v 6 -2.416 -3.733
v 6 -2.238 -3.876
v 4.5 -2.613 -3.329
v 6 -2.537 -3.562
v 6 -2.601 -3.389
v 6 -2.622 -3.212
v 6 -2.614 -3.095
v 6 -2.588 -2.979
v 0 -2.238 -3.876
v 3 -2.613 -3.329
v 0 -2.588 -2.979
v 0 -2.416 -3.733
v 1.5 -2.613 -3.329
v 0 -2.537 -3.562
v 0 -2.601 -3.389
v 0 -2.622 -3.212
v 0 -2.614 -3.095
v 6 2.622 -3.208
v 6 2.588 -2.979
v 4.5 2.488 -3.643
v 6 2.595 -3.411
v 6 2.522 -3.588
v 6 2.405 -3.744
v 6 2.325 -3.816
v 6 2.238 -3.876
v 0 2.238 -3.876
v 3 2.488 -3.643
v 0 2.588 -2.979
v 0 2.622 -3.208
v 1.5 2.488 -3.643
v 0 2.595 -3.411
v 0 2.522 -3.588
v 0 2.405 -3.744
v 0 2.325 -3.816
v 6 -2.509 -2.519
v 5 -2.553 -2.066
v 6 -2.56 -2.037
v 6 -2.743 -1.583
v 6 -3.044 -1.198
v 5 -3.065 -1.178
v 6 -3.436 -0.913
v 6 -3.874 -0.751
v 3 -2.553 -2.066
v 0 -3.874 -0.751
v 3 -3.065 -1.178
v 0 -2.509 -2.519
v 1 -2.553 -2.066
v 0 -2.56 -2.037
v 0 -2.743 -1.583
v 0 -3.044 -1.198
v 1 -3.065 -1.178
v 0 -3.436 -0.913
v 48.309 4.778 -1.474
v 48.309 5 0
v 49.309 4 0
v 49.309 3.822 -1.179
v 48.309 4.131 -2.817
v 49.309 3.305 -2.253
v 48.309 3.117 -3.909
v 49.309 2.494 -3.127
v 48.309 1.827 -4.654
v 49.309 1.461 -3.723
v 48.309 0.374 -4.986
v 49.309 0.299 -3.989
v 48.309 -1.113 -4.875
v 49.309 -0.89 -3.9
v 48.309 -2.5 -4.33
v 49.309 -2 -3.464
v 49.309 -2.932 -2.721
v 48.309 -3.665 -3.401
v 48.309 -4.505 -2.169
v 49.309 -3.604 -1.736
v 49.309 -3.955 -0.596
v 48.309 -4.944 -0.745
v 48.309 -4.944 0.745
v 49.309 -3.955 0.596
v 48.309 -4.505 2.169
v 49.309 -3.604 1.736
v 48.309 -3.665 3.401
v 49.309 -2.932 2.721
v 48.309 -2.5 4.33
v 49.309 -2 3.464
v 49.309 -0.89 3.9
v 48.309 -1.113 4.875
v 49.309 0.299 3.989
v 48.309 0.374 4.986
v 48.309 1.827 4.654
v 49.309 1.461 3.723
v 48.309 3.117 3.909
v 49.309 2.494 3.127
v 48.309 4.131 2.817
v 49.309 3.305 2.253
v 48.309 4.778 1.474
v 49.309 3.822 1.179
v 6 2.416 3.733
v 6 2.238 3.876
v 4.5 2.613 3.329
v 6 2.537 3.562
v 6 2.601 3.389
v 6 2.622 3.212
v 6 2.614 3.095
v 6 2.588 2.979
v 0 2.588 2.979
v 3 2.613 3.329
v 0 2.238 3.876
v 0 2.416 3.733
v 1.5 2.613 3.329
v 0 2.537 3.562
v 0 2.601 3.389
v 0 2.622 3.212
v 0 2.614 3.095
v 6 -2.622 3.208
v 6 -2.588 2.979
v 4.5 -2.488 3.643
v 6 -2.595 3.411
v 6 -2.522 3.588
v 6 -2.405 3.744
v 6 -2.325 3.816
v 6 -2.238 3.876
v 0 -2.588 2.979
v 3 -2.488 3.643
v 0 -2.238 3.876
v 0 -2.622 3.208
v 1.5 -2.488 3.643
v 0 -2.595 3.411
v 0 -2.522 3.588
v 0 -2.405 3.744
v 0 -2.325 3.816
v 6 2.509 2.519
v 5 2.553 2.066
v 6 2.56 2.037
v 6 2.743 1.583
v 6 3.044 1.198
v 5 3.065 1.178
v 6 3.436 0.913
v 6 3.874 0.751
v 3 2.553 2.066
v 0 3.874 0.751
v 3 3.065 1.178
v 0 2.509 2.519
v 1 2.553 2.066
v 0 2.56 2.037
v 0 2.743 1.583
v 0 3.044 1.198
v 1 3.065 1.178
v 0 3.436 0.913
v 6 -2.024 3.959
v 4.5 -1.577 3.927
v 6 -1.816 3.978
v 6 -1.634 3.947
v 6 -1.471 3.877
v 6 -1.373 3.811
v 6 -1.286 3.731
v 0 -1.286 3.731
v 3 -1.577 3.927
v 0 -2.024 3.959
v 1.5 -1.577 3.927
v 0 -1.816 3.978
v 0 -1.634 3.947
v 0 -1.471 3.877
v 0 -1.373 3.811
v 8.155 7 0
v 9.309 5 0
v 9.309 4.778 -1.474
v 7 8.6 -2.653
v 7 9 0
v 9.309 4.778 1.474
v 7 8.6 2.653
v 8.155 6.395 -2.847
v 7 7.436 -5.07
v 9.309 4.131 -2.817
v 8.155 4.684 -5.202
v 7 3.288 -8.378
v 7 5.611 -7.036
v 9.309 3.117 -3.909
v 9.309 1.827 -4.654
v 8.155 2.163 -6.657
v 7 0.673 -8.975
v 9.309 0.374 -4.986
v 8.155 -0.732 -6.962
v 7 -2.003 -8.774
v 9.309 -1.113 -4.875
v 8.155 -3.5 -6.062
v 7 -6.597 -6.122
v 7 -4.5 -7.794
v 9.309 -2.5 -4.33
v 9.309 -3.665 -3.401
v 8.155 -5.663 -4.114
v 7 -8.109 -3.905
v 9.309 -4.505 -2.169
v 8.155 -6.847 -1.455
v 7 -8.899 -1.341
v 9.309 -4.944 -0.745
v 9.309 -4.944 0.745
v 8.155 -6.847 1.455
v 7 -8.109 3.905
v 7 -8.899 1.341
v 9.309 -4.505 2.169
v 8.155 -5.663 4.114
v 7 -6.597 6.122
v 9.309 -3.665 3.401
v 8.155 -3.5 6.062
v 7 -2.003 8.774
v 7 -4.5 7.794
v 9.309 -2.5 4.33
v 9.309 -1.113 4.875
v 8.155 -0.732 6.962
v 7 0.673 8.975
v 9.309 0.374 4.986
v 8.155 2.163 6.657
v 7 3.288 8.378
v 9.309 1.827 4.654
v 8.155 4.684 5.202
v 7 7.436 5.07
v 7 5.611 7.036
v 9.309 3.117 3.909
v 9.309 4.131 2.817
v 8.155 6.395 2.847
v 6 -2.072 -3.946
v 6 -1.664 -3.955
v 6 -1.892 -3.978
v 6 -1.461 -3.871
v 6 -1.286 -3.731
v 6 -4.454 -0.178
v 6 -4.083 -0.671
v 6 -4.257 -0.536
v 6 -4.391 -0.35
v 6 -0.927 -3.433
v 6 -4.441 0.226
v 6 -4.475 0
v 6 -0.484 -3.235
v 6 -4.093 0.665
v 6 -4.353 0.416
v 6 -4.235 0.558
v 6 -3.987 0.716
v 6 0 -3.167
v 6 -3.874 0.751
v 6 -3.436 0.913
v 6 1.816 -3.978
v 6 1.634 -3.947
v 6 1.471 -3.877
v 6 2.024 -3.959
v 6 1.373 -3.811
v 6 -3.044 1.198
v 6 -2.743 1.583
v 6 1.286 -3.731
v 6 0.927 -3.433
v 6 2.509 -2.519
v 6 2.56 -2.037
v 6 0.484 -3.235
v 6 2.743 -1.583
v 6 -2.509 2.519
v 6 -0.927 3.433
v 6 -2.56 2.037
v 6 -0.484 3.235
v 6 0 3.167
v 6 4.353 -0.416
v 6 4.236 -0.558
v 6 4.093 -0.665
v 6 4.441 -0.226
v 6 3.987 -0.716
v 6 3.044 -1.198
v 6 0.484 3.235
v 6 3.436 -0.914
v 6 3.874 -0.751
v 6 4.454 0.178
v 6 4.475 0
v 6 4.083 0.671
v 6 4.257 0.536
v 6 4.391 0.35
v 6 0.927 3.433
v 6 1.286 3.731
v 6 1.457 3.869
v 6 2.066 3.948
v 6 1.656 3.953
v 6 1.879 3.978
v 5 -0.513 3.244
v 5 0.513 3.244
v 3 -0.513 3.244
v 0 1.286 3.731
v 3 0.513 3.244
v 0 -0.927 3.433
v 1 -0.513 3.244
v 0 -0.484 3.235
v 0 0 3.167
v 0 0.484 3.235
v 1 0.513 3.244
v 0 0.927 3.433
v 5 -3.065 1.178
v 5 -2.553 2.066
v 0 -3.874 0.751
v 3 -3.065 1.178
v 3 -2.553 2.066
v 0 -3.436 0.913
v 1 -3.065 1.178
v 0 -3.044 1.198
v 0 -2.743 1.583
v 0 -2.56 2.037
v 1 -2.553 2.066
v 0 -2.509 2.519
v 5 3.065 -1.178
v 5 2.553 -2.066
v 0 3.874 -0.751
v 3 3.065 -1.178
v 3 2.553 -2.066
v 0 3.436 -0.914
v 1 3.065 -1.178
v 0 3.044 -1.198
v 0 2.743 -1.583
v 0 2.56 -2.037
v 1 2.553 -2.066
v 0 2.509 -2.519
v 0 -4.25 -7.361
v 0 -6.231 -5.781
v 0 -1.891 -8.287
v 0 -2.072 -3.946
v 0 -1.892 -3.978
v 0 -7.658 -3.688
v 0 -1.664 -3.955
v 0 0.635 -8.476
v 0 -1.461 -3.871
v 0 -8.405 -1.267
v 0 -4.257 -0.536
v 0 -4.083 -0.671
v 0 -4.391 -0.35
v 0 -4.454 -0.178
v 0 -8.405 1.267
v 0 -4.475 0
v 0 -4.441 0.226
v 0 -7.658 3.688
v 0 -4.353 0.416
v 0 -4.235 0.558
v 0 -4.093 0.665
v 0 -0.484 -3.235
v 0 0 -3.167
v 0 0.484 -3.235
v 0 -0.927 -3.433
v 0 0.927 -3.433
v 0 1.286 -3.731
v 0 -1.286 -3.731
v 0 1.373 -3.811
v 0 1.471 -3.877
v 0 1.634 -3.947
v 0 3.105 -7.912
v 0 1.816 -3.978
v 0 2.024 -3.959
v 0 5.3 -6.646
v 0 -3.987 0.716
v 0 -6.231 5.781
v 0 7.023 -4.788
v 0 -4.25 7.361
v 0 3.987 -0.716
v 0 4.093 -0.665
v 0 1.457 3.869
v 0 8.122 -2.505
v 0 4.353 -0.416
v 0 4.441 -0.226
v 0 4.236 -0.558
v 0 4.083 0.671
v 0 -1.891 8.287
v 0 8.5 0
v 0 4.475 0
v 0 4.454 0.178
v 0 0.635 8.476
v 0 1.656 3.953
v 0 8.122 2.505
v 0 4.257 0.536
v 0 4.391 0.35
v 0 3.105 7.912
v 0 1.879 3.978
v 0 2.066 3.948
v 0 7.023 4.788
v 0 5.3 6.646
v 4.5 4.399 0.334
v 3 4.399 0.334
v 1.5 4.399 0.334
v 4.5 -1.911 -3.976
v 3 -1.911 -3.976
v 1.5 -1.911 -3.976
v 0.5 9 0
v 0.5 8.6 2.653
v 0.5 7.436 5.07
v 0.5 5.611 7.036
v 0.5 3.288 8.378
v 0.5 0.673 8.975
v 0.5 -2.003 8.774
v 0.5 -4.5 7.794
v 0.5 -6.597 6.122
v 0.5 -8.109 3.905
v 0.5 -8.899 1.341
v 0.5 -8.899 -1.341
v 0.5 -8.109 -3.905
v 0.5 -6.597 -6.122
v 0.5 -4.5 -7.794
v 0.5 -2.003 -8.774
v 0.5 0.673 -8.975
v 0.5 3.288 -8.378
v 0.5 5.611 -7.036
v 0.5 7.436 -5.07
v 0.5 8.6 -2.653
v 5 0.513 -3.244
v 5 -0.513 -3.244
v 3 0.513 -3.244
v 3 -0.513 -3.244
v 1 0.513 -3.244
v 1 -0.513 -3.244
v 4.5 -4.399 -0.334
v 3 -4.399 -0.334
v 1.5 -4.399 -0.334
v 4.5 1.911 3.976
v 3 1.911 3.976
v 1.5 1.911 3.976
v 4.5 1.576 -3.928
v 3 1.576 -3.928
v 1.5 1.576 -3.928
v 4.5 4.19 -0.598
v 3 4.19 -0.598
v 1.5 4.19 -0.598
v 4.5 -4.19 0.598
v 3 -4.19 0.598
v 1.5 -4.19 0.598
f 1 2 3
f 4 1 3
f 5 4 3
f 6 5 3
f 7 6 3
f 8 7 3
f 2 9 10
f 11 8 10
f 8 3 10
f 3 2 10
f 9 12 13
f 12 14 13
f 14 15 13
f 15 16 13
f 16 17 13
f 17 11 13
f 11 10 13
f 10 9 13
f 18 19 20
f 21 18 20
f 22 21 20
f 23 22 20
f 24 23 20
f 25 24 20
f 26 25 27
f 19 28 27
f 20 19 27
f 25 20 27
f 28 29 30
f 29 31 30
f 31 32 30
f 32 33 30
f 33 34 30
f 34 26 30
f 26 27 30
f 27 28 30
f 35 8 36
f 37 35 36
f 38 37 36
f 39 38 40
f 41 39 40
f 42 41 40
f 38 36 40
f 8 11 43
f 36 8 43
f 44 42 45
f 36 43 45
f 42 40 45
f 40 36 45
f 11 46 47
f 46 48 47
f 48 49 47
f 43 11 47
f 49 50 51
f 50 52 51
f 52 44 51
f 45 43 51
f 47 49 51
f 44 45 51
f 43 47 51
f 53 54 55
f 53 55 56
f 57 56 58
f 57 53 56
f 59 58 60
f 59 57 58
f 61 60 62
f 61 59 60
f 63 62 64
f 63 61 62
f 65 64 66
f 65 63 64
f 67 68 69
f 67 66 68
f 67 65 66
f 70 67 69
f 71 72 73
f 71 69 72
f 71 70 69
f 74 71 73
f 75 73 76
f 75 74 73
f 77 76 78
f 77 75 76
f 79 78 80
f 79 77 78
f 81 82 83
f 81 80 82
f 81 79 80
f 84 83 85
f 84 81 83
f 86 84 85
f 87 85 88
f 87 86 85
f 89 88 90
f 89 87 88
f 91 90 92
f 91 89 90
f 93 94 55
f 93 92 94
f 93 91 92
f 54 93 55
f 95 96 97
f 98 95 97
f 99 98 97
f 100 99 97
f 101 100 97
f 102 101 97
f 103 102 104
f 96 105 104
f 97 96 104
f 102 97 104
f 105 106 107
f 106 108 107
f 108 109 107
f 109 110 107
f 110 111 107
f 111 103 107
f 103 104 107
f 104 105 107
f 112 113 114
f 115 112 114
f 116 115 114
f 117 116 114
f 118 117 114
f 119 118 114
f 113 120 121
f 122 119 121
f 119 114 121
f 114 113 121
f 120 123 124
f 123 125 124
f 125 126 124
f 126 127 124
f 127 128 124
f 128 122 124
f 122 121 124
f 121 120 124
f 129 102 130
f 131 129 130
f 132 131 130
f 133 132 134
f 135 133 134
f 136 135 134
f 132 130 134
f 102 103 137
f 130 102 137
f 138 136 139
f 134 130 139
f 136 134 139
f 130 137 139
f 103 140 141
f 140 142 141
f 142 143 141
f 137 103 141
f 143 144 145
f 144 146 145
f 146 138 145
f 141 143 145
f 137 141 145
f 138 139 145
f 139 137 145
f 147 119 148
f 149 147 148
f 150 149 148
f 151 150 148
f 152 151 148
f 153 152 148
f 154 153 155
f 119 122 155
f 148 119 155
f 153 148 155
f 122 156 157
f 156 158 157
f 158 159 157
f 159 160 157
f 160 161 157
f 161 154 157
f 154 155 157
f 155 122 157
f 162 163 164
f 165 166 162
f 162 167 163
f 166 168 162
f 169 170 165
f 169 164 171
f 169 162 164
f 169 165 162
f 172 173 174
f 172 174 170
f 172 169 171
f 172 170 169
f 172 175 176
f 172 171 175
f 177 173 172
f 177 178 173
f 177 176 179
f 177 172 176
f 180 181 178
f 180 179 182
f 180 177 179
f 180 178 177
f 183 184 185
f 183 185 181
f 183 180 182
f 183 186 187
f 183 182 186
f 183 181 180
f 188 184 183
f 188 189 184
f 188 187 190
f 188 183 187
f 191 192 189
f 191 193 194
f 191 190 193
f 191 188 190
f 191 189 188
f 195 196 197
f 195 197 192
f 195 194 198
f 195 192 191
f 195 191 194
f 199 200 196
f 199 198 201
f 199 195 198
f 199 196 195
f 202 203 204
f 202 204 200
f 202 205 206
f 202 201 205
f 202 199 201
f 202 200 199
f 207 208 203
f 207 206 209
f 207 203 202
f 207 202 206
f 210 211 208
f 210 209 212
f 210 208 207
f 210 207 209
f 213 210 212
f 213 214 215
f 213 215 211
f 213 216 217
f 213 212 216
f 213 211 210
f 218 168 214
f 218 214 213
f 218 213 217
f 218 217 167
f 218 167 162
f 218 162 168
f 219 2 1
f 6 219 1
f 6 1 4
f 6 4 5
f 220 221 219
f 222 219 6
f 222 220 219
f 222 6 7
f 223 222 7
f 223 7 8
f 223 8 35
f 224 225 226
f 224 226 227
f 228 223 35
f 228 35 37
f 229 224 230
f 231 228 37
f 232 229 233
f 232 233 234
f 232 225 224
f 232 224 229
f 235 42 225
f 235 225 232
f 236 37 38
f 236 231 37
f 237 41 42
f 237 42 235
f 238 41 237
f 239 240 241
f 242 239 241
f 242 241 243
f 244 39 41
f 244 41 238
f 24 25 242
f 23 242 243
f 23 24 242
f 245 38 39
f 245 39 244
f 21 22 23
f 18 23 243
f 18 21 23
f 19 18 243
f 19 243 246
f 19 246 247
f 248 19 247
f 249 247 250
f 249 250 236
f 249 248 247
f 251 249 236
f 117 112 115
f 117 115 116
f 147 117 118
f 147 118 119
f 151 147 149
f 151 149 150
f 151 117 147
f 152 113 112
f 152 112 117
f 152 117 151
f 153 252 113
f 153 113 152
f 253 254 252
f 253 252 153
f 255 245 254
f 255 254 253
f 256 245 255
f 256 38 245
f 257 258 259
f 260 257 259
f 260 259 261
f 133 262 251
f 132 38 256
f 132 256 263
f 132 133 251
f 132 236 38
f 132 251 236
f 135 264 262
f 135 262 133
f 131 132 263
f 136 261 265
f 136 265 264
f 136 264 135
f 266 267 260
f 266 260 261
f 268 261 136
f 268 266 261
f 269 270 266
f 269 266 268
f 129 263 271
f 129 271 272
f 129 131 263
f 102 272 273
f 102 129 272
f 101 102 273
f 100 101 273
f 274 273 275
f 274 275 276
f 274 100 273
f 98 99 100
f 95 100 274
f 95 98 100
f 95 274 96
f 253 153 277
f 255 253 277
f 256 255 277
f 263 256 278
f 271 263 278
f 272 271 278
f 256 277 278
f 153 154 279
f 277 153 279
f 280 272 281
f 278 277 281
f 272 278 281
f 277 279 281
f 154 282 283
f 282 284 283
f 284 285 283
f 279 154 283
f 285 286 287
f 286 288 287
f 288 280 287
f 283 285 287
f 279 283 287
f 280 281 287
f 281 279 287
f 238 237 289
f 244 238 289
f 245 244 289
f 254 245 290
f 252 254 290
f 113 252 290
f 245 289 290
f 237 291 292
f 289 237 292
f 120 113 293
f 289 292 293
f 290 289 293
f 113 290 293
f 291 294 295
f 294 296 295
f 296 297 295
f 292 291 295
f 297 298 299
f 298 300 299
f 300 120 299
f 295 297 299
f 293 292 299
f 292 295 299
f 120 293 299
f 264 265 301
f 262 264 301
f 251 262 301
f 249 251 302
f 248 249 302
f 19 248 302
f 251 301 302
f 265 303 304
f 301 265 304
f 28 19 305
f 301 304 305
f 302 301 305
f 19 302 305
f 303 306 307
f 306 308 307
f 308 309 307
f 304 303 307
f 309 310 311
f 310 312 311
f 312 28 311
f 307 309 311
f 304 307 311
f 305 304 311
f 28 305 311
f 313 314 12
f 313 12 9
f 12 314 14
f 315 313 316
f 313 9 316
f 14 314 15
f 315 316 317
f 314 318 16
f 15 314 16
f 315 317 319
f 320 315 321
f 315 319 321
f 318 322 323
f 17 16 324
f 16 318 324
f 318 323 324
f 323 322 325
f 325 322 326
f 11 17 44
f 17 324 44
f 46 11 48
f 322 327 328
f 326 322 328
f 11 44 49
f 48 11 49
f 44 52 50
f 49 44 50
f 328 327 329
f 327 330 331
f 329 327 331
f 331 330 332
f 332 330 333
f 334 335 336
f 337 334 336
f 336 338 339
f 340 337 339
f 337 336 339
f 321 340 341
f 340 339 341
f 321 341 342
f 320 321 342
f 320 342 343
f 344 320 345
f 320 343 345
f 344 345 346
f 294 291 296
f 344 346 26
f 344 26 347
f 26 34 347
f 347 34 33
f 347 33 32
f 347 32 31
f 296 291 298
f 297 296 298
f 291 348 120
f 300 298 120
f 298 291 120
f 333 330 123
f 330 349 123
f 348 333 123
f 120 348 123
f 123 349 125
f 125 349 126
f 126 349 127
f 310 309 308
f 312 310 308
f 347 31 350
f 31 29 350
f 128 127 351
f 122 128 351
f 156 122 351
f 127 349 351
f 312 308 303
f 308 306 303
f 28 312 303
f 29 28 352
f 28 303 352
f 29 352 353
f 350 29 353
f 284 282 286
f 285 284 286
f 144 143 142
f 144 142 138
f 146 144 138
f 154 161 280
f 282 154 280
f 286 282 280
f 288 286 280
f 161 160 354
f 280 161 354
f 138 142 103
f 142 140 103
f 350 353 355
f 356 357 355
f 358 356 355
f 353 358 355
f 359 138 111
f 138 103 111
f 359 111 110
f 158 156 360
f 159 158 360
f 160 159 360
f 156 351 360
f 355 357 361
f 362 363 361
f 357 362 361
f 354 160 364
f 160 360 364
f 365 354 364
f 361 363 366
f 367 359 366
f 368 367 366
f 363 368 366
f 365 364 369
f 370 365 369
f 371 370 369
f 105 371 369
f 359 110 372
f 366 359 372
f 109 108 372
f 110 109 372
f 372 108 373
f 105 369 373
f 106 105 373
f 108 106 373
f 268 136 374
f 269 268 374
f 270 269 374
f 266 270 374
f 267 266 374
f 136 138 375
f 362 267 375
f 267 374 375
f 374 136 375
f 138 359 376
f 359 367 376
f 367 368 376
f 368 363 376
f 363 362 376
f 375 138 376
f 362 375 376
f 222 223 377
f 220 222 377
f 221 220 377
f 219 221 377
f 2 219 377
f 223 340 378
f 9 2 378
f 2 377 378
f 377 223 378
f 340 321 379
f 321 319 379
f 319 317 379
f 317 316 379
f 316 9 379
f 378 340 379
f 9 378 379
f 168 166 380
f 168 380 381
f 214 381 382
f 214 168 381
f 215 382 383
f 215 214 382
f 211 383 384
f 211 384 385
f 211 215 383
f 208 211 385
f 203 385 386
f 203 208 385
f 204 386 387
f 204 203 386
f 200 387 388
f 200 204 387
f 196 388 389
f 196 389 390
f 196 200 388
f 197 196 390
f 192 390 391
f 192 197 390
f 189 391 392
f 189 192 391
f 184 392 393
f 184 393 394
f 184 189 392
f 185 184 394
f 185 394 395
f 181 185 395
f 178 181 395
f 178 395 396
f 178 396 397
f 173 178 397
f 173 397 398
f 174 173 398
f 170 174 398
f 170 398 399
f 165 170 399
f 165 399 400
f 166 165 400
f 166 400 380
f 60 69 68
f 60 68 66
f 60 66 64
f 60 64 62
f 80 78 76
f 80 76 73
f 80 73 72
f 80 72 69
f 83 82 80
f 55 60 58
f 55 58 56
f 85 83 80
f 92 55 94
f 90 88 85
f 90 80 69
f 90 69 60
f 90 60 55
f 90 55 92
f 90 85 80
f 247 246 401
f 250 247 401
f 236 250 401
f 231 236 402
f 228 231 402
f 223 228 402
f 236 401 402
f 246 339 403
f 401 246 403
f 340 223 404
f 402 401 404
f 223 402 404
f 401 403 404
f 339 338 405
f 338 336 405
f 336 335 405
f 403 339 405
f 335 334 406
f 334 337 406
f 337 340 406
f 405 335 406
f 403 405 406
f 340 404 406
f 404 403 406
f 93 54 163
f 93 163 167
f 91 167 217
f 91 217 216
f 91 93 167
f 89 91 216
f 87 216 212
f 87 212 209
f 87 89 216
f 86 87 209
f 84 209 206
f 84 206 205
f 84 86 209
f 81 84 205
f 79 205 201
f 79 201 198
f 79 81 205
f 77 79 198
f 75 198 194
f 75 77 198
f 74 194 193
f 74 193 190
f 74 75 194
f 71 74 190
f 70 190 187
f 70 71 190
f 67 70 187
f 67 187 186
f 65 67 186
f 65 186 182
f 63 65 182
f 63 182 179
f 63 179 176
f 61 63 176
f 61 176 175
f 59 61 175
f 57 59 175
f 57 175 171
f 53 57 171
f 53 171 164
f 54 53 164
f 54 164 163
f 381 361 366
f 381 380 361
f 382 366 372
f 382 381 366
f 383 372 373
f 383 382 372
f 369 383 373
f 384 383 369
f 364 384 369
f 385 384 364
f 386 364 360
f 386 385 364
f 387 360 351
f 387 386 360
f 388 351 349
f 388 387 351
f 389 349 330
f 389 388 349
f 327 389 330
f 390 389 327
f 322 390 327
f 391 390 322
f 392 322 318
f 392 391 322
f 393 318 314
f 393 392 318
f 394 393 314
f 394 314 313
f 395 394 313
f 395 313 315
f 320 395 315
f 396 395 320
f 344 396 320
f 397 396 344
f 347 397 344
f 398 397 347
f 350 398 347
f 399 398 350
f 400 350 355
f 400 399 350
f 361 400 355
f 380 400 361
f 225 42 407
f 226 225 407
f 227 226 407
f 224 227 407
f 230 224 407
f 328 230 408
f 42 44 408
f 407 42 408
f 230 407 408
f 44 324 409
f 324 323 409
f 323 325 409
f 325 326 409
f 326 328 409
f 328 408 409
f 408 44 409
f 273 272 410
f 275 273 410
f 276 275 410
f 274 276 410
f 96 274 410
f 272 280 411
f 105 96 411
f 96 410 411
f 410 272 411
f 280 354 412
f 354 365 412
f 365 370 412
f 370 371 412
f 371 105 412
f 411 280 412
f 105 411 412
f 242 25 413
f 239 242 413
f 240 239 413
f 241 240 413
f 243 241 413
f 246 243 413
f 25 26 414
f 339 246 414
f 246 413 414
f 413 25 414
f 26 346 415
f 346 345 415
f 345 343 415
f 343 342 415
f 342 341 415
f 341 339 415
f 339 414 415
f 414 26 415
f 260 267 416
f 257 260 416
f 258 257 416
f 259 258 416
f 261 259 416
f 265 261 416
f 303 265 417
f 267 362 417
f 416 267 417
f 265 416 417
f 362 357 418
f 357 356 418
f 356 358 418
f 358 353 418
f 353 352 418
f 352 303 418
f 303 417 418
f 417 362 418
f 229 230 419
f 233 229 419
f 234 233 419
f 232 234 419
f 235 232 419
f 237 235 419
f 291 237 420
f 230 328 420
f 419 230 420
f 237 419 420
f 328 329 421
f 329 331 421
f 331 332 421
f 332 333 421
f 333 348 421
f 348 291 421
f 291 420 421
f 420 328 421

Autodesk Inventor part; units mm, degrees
ref_plane "YZ Plane" through (0, 0, 0) normal (1, 0, 0) x (0, 1, 0)
ref_plane "XZ Plane" through (0, 0, 0) normal (0, 1, 0) x (-1, 0, 0)
ref_plane "XY Plane" through (0, 0, 0) normal (0, 0, 1) x (1, 0, 0)
sketch "Skizze1" plane through (0, 0, 0) normal (0, 0, 1) x (1, 0, 0)
  line L0 (-9.8619, 0) -> (59.1713, 0) projected
  line L1 (0, -1.8) -> (0, 10.8) projected
  line L2 (0, 0) -> (0, 9)
  line L3 (0, 9) -> (7, 9)
  line L4 (7, 9) -> (9.3094, 5)
  line L5 (9.3094, 5) -> (49.3094, 5)
  line L6 (49.3094, 5) -> (49.3094, 0)
  line L7 (49.3094, 0) -> (0, 0)
  dimension "d0" = 18
  dimension "d1" = 7
  dimension "d3" = 10
  dimension "d4" = 40
  dimension "d16" = 60
revolve "Umdrehung1" add sketch "Skizze1" angle 360 about axis through (-10, 0, 0) along (1, 0, 0)
chamfer "Fase1" distance 1 angle 45 1 edges at (49.3094, -5, 0)
chamfer "Fase2" distance 0.5 angle 45 1 edges at (0, -9, 0)
thread "Gewinde1" size "M10x1.5" class "6g" standard "ANSI Metric M Profile" full length
sketch "Skizze2" plane through (0, 0, 0) normal (-1, 0, 0) x (0, 0, 1)
  spline S0 degree 3 poles (0.7512, 3.8741) (0.7506, 3.8768) (0.75, 3.8795) (0.7227, 3.995) (0.6691, 4.1023) (0.5302, 4.2738) (0.4382, 4.3487) (0.229, 4.4493) (0.1117, 4.475) (0, 4.475) knots 2.407009 2.407009 2.407009 2.407009 2.415407 2.415407 2.762565 2.762565 3.097556 3.097556 3.432546 3.432546 3.432546 3.432546
  spline S1 degree 3 poles (0, 4.475) (-0.1117, 4.475) (-0.229, 4.4493) (-0.4383, 4.3487) (-0.5302, 4.2739) (-0.6692, 4.1024) (-0.7228, 3.995) (-0.7501, 3.8795) (-0.7507, 3.8768) (-0.7514, 3.8741) knots 3.432546 3.432546 3.432546 3.432546 3.767537 3.767537 4.102528 4.102528 4.449685 4.449685 4.458083 4.458083 4.458083 4.458083
  spline S2 degree 3 poles (-0.7514, 3.8741) (-0.7825, 3.7367) (-0.83, 3.604) (-0.9596, 3.341) (-1.058, 3.1943) (-1.298, 2.9367) (-1.4398, 2.8257) (-1.7272, 2.6597) (-1.8942, 2.5924) (-2.2374, 2.5134) (-2.4136, 2.5016) (-2.7062, 2.5208) (-2.8448, 2.546) (-2.9794, 2.5877) knots 7.439135 7.439135 7.439135 7.439135 7.853901 7.853901 8.351764 8.351764 8.849626 8.849626 9.347489 9.347489 9.845351 9.845351 10.260117 10.260117 10.260117 10.260117
  spline S3 degree 3 poles (-2.9794, 2.5877) (-2.982, 2.5886) (-2.9847, 2.5894) (-3.0984, 2.6235) (-3.2181, 2.6307) (-3.4362, 2.5961) (-3.547, 2.5539) (-3.7387, 2.423) (-3.8196, 2.3342) (-3.8755, 2.2375) knots 2.407009 2.407009 2.407009 2.407009 2.415407 2.415407 2.762565 2.762565 3.097556 3.097556 3.432546 3.432546 3.432546 3.432546
  spline S4 degree 3 poles (-3.8755, 2.2375) (-3.9313, 2.1408) (-3.9677, 2.0263) (-3.9853, 1.7948) (-3.9664, 1.6777) (-3.8873, 1.4716) (-3.8212, 1.3716) (-3.7348, 1.2902) (-3.7328, 1.2882) (-3.7307, 1.2863) knots 3.432546 3.432546 3.432546 3.432546 3.767537 3.767537 4.102528 4.102528 4.449685 4.449685 4.458083 4.458083 4.458083 4.458083
  spline S5 degree 3 poles (-3.7307, 1.2863) (-3.6273, 1.1907) (-3.5361, 1.0832) (-3.3732, 0.8394) (-3.2953, 0.6809) (-3.1922, 0.3442) (-3.167, 0.1659) (-3.1669, -0.166) (-3.1921, -0.3443) (-3.2953, -0.681) (-3.3731, -0.8395) (-3.536, -1.0833) (-3.6272, -1.1908) (-3.7306, -1.2865) knots 7.439135 7.439135 7.439135 7.439135 7.853901 7.853901 8.351764 8.351764 8.849626 8.849626 9.347489 9.347489 9.845351 9.845351 10.260117 10.260117 10.260117 10.260117
  spline S6 degree 3 poles (-3.7306, -1.2865) (-3.7327, -1.2884) (-3.7347, -1.2903) (-3.8211, -1.3717) (-3.8872, -1.4717) (-3.9663, -1.6778) (-3.9852, -1.7948) (-3.9677, -2.0263) (-3.9313, -2.1408) (-3.8755, -2.2375) knots 2.407009 2.407009 2.407009 2.407009 2.415407 2.415407 2.762565 2.762565 3.097556 3.097556 3.432546 3.432546 3.432546 3.432546
  spline S7 degree 3 poles (-3.8755, -2.2375) (-3.8196, -2.3342) (-3.7387, -2.4229) (-3.547, -2.5539) (-3.4362, -2.5961) (-3.2182, -2.6306) (-3.0984, -2.6233) (-2.9848, -2.5893) (-2.9821, -2.5884) (-2.9794, -2.5876) knots 3.432546 3.432546 3.432546 3.432546 3.767537 3.767537 4.102528 4.102528 4.449685 4.449685 4.458083 4.458083 4.458083 4.458083
  spline S8 degree 3 poles (-2.9794, -2.5876) (-2.8449, -2.5459) (-2.7062, -2.5206) (-2.4136, -2.5014) (-2.2374, -2.5132) (-1.8942, -2.5923) (-1.7272, -2.6596) (-1.4397, -2.8256) (-1.2979, -2.9365) (-1.0578, -3.1942) (-0.9595, -3.3409) (-0.8298, -3.6039) (-0.7824, -3.7367) (-0.7512, -3.8741) knots 7.439135 7.439135 7.439135 7.439135 7.853901 7.853901 8.351764 8.351764 8.849626 8.849626 9.347489 9.347489 9.845351 9.845351 10.260117 10.260117 10.260117 10.260117
  spline S9 degree 3 poles (-0.7512, -3.8741) (-0.7506, -3.8768) (-0.75, -3.8795) (-0.7227, -3.995) (-0.6691, -4.1023) (-0.5302, -4.2738) (-0.4382, -4.3487) (-0.229, -4.4493) (-0.1117, -4.475) (0, -4.475) knots 2.407009 2.407009 2.407009 2.407009 2.415407 2.415407 2.762565 2.762565 3.097556 3.097556 3.432546 3.432546 3.432546 3.432546
  spline S10 degree 3 poles (0, -4.475) (0.1117, -4.475) (0.229, -4.4493) (0.4382, -4.3487) (0.5302, -4.2738) (0.6691, -4.1023) (0.7227, -3.995) (0.75, -3.8795) (0.7506, -3.8768) (0.7512, -3.8741) knots 3.432546 3.432546 3.432546 3.432546 3.767537 3.767537 4.102528 4.102528 4.449685 4.449685 4.458083 4.458083 4.458083 4.458083
  spline S11 degree 3 poles (0.7512, -3.8741) (0.7824, -3.7367) (0.8298, -3.604) (0.9595, -3.341) (1.0579, -3.1943) (1.2979, -2.9366) (1.4397, -2.8257) (1.7272, -2.6597) (1.8942, -2.5924) (2.2374, -2.5134) (2.4136, -2.5015) (2.7062, -2.5208) (2.8448, -2.546) (2.9794, -2.5877) knots 7.439135 7.439135 7.439135 7.439135 7.853901 7.853901 8.351764 8.351764 8.849626 8.849626 9.347489 9.347489 9.845351 9.845351 10.260117 10.260117 10.260117 10.260117
  spline S12 degree 3 poles (2.9794, -2.5877) (2.982, -2.5886) (2.9847, -2.5894) (3.0984, -2.6235) (3.2181, -2.6307) (3.4362, -2.5961) (3.547, -2.5539) (3.7387, -2.423) (3.8196, -2.3342) (3.8755, -2.2375) knots 2.407009 2.407009 2.407009 2.407009 2.415407 2.415407 2.762565 2.762565 3.097556 3.097556 3.432546 3.432546 3.432546 3.432546
  spline S13 degree 3 poles (3.8755, -2.2375) (3.9313, -2.1408) (3.9677, -2.0263) (3.9852, -1.7948) (3.9663, -1.6778) (3.8872, -1.4717) (3.8211, -1.3717) (3.7347, -1.2903) (3.7327, -1.2884) (3.7306, -1.2865) knots 3.432546 3.432546 3.432546 3.432546 3.767537 3.767537 4.102528 4.102528 4.449685 4.449685 4.458083 4.458083 4.458083 4.458083
  spline S14 degree 3 poles (3.7306, -1.2865) (3.6272, -1.1908) (3.536, -1.0833) (3.3731, -0.8395) (3.2953, -0.681) (3.1921, -0.3443) (3.1669, -0.166) (3.167, 0.1659) (3.1922, 0.3442) (3.2953, 0.6809) (3.3732, 0.8394) (3.5361, 1.0832) (3.6273, 1.1907) (3.7307, 1.2863) knots 7.439135 7.439135 7.439135 7.439135 7.853901 7.853901 8.351764 8.351764 8.849626 8.849626 9.347489 9.347489 9.845351 9.845351 10.260117 10.260117 10.260117 10.260117
  spline S15 degree 3 poles (3.7307, 1.2863) (3.7328, 1.2882) (3.7348, 1.2902) (3.8212, 1.3716) (3.8873, 1.4716) (3.9664, 1.6777) (3.9853, 1.7948) (3.9677, 2.0263) (3.9313, 2.1408) (3.8755, 2.2375) knots 2.407009 2.407009 2.407009 2.407009 2.415407 2.415407 2.762565 2.762565 3.097556 3.097556 3.432546 3.432546 3.432546 3.432546
  spline S16 degree 3 poles (3.8755, 2.2375) (3.8196, 2.3342) (3.7387, 2.423) (3.547, 2.5539) (3.4362, 2.5961) (3.2181, 2.6307) (3.0984, 2.6235) (2.9847, 2.5894) (2.982, 2.5886) (2.9794, 2.5877) knots 3.432546 3.432546 3.432546 3.432546 3.767537 3.767537 4.102528 4.102528 4.449685 4.449685 4.458083 4.458083 4.458083 4.458083
  spline S17 degree 3 poles (2.9794, 2.5877) (2.8448, 2.546) (2.7062, 2.5208) (2.4136, 2.5015) (2.2374, 2.5134) (1.8942, 2.5924) (1.7272, 2.6597) (1.4397, 2.8257) (1.2979, 2.9366) (1.0579, 3.1943) (0.9595, 3.341) (0.8298, 3.604) (0.7824, 3.7367) (0.7512, 3.8741) knots 7.439135 7.439135 7.439135 7.439135 7.853901 7.853901 8.351764 8.351764 8.849626 8.849626 9.347489 9.347489 9.845351 9.845351 10.260117 10.260117 10.260117 10.260117
  point P0 (0, 0)
  point P1 (0, 0)
  point P2 (0, 0)
extrude "Extrusion1" cut sketch "Skizze2" against normal blind 6
properties part number "Torx T50 M10 x 1,25" material "钢，高强度，低合金"
